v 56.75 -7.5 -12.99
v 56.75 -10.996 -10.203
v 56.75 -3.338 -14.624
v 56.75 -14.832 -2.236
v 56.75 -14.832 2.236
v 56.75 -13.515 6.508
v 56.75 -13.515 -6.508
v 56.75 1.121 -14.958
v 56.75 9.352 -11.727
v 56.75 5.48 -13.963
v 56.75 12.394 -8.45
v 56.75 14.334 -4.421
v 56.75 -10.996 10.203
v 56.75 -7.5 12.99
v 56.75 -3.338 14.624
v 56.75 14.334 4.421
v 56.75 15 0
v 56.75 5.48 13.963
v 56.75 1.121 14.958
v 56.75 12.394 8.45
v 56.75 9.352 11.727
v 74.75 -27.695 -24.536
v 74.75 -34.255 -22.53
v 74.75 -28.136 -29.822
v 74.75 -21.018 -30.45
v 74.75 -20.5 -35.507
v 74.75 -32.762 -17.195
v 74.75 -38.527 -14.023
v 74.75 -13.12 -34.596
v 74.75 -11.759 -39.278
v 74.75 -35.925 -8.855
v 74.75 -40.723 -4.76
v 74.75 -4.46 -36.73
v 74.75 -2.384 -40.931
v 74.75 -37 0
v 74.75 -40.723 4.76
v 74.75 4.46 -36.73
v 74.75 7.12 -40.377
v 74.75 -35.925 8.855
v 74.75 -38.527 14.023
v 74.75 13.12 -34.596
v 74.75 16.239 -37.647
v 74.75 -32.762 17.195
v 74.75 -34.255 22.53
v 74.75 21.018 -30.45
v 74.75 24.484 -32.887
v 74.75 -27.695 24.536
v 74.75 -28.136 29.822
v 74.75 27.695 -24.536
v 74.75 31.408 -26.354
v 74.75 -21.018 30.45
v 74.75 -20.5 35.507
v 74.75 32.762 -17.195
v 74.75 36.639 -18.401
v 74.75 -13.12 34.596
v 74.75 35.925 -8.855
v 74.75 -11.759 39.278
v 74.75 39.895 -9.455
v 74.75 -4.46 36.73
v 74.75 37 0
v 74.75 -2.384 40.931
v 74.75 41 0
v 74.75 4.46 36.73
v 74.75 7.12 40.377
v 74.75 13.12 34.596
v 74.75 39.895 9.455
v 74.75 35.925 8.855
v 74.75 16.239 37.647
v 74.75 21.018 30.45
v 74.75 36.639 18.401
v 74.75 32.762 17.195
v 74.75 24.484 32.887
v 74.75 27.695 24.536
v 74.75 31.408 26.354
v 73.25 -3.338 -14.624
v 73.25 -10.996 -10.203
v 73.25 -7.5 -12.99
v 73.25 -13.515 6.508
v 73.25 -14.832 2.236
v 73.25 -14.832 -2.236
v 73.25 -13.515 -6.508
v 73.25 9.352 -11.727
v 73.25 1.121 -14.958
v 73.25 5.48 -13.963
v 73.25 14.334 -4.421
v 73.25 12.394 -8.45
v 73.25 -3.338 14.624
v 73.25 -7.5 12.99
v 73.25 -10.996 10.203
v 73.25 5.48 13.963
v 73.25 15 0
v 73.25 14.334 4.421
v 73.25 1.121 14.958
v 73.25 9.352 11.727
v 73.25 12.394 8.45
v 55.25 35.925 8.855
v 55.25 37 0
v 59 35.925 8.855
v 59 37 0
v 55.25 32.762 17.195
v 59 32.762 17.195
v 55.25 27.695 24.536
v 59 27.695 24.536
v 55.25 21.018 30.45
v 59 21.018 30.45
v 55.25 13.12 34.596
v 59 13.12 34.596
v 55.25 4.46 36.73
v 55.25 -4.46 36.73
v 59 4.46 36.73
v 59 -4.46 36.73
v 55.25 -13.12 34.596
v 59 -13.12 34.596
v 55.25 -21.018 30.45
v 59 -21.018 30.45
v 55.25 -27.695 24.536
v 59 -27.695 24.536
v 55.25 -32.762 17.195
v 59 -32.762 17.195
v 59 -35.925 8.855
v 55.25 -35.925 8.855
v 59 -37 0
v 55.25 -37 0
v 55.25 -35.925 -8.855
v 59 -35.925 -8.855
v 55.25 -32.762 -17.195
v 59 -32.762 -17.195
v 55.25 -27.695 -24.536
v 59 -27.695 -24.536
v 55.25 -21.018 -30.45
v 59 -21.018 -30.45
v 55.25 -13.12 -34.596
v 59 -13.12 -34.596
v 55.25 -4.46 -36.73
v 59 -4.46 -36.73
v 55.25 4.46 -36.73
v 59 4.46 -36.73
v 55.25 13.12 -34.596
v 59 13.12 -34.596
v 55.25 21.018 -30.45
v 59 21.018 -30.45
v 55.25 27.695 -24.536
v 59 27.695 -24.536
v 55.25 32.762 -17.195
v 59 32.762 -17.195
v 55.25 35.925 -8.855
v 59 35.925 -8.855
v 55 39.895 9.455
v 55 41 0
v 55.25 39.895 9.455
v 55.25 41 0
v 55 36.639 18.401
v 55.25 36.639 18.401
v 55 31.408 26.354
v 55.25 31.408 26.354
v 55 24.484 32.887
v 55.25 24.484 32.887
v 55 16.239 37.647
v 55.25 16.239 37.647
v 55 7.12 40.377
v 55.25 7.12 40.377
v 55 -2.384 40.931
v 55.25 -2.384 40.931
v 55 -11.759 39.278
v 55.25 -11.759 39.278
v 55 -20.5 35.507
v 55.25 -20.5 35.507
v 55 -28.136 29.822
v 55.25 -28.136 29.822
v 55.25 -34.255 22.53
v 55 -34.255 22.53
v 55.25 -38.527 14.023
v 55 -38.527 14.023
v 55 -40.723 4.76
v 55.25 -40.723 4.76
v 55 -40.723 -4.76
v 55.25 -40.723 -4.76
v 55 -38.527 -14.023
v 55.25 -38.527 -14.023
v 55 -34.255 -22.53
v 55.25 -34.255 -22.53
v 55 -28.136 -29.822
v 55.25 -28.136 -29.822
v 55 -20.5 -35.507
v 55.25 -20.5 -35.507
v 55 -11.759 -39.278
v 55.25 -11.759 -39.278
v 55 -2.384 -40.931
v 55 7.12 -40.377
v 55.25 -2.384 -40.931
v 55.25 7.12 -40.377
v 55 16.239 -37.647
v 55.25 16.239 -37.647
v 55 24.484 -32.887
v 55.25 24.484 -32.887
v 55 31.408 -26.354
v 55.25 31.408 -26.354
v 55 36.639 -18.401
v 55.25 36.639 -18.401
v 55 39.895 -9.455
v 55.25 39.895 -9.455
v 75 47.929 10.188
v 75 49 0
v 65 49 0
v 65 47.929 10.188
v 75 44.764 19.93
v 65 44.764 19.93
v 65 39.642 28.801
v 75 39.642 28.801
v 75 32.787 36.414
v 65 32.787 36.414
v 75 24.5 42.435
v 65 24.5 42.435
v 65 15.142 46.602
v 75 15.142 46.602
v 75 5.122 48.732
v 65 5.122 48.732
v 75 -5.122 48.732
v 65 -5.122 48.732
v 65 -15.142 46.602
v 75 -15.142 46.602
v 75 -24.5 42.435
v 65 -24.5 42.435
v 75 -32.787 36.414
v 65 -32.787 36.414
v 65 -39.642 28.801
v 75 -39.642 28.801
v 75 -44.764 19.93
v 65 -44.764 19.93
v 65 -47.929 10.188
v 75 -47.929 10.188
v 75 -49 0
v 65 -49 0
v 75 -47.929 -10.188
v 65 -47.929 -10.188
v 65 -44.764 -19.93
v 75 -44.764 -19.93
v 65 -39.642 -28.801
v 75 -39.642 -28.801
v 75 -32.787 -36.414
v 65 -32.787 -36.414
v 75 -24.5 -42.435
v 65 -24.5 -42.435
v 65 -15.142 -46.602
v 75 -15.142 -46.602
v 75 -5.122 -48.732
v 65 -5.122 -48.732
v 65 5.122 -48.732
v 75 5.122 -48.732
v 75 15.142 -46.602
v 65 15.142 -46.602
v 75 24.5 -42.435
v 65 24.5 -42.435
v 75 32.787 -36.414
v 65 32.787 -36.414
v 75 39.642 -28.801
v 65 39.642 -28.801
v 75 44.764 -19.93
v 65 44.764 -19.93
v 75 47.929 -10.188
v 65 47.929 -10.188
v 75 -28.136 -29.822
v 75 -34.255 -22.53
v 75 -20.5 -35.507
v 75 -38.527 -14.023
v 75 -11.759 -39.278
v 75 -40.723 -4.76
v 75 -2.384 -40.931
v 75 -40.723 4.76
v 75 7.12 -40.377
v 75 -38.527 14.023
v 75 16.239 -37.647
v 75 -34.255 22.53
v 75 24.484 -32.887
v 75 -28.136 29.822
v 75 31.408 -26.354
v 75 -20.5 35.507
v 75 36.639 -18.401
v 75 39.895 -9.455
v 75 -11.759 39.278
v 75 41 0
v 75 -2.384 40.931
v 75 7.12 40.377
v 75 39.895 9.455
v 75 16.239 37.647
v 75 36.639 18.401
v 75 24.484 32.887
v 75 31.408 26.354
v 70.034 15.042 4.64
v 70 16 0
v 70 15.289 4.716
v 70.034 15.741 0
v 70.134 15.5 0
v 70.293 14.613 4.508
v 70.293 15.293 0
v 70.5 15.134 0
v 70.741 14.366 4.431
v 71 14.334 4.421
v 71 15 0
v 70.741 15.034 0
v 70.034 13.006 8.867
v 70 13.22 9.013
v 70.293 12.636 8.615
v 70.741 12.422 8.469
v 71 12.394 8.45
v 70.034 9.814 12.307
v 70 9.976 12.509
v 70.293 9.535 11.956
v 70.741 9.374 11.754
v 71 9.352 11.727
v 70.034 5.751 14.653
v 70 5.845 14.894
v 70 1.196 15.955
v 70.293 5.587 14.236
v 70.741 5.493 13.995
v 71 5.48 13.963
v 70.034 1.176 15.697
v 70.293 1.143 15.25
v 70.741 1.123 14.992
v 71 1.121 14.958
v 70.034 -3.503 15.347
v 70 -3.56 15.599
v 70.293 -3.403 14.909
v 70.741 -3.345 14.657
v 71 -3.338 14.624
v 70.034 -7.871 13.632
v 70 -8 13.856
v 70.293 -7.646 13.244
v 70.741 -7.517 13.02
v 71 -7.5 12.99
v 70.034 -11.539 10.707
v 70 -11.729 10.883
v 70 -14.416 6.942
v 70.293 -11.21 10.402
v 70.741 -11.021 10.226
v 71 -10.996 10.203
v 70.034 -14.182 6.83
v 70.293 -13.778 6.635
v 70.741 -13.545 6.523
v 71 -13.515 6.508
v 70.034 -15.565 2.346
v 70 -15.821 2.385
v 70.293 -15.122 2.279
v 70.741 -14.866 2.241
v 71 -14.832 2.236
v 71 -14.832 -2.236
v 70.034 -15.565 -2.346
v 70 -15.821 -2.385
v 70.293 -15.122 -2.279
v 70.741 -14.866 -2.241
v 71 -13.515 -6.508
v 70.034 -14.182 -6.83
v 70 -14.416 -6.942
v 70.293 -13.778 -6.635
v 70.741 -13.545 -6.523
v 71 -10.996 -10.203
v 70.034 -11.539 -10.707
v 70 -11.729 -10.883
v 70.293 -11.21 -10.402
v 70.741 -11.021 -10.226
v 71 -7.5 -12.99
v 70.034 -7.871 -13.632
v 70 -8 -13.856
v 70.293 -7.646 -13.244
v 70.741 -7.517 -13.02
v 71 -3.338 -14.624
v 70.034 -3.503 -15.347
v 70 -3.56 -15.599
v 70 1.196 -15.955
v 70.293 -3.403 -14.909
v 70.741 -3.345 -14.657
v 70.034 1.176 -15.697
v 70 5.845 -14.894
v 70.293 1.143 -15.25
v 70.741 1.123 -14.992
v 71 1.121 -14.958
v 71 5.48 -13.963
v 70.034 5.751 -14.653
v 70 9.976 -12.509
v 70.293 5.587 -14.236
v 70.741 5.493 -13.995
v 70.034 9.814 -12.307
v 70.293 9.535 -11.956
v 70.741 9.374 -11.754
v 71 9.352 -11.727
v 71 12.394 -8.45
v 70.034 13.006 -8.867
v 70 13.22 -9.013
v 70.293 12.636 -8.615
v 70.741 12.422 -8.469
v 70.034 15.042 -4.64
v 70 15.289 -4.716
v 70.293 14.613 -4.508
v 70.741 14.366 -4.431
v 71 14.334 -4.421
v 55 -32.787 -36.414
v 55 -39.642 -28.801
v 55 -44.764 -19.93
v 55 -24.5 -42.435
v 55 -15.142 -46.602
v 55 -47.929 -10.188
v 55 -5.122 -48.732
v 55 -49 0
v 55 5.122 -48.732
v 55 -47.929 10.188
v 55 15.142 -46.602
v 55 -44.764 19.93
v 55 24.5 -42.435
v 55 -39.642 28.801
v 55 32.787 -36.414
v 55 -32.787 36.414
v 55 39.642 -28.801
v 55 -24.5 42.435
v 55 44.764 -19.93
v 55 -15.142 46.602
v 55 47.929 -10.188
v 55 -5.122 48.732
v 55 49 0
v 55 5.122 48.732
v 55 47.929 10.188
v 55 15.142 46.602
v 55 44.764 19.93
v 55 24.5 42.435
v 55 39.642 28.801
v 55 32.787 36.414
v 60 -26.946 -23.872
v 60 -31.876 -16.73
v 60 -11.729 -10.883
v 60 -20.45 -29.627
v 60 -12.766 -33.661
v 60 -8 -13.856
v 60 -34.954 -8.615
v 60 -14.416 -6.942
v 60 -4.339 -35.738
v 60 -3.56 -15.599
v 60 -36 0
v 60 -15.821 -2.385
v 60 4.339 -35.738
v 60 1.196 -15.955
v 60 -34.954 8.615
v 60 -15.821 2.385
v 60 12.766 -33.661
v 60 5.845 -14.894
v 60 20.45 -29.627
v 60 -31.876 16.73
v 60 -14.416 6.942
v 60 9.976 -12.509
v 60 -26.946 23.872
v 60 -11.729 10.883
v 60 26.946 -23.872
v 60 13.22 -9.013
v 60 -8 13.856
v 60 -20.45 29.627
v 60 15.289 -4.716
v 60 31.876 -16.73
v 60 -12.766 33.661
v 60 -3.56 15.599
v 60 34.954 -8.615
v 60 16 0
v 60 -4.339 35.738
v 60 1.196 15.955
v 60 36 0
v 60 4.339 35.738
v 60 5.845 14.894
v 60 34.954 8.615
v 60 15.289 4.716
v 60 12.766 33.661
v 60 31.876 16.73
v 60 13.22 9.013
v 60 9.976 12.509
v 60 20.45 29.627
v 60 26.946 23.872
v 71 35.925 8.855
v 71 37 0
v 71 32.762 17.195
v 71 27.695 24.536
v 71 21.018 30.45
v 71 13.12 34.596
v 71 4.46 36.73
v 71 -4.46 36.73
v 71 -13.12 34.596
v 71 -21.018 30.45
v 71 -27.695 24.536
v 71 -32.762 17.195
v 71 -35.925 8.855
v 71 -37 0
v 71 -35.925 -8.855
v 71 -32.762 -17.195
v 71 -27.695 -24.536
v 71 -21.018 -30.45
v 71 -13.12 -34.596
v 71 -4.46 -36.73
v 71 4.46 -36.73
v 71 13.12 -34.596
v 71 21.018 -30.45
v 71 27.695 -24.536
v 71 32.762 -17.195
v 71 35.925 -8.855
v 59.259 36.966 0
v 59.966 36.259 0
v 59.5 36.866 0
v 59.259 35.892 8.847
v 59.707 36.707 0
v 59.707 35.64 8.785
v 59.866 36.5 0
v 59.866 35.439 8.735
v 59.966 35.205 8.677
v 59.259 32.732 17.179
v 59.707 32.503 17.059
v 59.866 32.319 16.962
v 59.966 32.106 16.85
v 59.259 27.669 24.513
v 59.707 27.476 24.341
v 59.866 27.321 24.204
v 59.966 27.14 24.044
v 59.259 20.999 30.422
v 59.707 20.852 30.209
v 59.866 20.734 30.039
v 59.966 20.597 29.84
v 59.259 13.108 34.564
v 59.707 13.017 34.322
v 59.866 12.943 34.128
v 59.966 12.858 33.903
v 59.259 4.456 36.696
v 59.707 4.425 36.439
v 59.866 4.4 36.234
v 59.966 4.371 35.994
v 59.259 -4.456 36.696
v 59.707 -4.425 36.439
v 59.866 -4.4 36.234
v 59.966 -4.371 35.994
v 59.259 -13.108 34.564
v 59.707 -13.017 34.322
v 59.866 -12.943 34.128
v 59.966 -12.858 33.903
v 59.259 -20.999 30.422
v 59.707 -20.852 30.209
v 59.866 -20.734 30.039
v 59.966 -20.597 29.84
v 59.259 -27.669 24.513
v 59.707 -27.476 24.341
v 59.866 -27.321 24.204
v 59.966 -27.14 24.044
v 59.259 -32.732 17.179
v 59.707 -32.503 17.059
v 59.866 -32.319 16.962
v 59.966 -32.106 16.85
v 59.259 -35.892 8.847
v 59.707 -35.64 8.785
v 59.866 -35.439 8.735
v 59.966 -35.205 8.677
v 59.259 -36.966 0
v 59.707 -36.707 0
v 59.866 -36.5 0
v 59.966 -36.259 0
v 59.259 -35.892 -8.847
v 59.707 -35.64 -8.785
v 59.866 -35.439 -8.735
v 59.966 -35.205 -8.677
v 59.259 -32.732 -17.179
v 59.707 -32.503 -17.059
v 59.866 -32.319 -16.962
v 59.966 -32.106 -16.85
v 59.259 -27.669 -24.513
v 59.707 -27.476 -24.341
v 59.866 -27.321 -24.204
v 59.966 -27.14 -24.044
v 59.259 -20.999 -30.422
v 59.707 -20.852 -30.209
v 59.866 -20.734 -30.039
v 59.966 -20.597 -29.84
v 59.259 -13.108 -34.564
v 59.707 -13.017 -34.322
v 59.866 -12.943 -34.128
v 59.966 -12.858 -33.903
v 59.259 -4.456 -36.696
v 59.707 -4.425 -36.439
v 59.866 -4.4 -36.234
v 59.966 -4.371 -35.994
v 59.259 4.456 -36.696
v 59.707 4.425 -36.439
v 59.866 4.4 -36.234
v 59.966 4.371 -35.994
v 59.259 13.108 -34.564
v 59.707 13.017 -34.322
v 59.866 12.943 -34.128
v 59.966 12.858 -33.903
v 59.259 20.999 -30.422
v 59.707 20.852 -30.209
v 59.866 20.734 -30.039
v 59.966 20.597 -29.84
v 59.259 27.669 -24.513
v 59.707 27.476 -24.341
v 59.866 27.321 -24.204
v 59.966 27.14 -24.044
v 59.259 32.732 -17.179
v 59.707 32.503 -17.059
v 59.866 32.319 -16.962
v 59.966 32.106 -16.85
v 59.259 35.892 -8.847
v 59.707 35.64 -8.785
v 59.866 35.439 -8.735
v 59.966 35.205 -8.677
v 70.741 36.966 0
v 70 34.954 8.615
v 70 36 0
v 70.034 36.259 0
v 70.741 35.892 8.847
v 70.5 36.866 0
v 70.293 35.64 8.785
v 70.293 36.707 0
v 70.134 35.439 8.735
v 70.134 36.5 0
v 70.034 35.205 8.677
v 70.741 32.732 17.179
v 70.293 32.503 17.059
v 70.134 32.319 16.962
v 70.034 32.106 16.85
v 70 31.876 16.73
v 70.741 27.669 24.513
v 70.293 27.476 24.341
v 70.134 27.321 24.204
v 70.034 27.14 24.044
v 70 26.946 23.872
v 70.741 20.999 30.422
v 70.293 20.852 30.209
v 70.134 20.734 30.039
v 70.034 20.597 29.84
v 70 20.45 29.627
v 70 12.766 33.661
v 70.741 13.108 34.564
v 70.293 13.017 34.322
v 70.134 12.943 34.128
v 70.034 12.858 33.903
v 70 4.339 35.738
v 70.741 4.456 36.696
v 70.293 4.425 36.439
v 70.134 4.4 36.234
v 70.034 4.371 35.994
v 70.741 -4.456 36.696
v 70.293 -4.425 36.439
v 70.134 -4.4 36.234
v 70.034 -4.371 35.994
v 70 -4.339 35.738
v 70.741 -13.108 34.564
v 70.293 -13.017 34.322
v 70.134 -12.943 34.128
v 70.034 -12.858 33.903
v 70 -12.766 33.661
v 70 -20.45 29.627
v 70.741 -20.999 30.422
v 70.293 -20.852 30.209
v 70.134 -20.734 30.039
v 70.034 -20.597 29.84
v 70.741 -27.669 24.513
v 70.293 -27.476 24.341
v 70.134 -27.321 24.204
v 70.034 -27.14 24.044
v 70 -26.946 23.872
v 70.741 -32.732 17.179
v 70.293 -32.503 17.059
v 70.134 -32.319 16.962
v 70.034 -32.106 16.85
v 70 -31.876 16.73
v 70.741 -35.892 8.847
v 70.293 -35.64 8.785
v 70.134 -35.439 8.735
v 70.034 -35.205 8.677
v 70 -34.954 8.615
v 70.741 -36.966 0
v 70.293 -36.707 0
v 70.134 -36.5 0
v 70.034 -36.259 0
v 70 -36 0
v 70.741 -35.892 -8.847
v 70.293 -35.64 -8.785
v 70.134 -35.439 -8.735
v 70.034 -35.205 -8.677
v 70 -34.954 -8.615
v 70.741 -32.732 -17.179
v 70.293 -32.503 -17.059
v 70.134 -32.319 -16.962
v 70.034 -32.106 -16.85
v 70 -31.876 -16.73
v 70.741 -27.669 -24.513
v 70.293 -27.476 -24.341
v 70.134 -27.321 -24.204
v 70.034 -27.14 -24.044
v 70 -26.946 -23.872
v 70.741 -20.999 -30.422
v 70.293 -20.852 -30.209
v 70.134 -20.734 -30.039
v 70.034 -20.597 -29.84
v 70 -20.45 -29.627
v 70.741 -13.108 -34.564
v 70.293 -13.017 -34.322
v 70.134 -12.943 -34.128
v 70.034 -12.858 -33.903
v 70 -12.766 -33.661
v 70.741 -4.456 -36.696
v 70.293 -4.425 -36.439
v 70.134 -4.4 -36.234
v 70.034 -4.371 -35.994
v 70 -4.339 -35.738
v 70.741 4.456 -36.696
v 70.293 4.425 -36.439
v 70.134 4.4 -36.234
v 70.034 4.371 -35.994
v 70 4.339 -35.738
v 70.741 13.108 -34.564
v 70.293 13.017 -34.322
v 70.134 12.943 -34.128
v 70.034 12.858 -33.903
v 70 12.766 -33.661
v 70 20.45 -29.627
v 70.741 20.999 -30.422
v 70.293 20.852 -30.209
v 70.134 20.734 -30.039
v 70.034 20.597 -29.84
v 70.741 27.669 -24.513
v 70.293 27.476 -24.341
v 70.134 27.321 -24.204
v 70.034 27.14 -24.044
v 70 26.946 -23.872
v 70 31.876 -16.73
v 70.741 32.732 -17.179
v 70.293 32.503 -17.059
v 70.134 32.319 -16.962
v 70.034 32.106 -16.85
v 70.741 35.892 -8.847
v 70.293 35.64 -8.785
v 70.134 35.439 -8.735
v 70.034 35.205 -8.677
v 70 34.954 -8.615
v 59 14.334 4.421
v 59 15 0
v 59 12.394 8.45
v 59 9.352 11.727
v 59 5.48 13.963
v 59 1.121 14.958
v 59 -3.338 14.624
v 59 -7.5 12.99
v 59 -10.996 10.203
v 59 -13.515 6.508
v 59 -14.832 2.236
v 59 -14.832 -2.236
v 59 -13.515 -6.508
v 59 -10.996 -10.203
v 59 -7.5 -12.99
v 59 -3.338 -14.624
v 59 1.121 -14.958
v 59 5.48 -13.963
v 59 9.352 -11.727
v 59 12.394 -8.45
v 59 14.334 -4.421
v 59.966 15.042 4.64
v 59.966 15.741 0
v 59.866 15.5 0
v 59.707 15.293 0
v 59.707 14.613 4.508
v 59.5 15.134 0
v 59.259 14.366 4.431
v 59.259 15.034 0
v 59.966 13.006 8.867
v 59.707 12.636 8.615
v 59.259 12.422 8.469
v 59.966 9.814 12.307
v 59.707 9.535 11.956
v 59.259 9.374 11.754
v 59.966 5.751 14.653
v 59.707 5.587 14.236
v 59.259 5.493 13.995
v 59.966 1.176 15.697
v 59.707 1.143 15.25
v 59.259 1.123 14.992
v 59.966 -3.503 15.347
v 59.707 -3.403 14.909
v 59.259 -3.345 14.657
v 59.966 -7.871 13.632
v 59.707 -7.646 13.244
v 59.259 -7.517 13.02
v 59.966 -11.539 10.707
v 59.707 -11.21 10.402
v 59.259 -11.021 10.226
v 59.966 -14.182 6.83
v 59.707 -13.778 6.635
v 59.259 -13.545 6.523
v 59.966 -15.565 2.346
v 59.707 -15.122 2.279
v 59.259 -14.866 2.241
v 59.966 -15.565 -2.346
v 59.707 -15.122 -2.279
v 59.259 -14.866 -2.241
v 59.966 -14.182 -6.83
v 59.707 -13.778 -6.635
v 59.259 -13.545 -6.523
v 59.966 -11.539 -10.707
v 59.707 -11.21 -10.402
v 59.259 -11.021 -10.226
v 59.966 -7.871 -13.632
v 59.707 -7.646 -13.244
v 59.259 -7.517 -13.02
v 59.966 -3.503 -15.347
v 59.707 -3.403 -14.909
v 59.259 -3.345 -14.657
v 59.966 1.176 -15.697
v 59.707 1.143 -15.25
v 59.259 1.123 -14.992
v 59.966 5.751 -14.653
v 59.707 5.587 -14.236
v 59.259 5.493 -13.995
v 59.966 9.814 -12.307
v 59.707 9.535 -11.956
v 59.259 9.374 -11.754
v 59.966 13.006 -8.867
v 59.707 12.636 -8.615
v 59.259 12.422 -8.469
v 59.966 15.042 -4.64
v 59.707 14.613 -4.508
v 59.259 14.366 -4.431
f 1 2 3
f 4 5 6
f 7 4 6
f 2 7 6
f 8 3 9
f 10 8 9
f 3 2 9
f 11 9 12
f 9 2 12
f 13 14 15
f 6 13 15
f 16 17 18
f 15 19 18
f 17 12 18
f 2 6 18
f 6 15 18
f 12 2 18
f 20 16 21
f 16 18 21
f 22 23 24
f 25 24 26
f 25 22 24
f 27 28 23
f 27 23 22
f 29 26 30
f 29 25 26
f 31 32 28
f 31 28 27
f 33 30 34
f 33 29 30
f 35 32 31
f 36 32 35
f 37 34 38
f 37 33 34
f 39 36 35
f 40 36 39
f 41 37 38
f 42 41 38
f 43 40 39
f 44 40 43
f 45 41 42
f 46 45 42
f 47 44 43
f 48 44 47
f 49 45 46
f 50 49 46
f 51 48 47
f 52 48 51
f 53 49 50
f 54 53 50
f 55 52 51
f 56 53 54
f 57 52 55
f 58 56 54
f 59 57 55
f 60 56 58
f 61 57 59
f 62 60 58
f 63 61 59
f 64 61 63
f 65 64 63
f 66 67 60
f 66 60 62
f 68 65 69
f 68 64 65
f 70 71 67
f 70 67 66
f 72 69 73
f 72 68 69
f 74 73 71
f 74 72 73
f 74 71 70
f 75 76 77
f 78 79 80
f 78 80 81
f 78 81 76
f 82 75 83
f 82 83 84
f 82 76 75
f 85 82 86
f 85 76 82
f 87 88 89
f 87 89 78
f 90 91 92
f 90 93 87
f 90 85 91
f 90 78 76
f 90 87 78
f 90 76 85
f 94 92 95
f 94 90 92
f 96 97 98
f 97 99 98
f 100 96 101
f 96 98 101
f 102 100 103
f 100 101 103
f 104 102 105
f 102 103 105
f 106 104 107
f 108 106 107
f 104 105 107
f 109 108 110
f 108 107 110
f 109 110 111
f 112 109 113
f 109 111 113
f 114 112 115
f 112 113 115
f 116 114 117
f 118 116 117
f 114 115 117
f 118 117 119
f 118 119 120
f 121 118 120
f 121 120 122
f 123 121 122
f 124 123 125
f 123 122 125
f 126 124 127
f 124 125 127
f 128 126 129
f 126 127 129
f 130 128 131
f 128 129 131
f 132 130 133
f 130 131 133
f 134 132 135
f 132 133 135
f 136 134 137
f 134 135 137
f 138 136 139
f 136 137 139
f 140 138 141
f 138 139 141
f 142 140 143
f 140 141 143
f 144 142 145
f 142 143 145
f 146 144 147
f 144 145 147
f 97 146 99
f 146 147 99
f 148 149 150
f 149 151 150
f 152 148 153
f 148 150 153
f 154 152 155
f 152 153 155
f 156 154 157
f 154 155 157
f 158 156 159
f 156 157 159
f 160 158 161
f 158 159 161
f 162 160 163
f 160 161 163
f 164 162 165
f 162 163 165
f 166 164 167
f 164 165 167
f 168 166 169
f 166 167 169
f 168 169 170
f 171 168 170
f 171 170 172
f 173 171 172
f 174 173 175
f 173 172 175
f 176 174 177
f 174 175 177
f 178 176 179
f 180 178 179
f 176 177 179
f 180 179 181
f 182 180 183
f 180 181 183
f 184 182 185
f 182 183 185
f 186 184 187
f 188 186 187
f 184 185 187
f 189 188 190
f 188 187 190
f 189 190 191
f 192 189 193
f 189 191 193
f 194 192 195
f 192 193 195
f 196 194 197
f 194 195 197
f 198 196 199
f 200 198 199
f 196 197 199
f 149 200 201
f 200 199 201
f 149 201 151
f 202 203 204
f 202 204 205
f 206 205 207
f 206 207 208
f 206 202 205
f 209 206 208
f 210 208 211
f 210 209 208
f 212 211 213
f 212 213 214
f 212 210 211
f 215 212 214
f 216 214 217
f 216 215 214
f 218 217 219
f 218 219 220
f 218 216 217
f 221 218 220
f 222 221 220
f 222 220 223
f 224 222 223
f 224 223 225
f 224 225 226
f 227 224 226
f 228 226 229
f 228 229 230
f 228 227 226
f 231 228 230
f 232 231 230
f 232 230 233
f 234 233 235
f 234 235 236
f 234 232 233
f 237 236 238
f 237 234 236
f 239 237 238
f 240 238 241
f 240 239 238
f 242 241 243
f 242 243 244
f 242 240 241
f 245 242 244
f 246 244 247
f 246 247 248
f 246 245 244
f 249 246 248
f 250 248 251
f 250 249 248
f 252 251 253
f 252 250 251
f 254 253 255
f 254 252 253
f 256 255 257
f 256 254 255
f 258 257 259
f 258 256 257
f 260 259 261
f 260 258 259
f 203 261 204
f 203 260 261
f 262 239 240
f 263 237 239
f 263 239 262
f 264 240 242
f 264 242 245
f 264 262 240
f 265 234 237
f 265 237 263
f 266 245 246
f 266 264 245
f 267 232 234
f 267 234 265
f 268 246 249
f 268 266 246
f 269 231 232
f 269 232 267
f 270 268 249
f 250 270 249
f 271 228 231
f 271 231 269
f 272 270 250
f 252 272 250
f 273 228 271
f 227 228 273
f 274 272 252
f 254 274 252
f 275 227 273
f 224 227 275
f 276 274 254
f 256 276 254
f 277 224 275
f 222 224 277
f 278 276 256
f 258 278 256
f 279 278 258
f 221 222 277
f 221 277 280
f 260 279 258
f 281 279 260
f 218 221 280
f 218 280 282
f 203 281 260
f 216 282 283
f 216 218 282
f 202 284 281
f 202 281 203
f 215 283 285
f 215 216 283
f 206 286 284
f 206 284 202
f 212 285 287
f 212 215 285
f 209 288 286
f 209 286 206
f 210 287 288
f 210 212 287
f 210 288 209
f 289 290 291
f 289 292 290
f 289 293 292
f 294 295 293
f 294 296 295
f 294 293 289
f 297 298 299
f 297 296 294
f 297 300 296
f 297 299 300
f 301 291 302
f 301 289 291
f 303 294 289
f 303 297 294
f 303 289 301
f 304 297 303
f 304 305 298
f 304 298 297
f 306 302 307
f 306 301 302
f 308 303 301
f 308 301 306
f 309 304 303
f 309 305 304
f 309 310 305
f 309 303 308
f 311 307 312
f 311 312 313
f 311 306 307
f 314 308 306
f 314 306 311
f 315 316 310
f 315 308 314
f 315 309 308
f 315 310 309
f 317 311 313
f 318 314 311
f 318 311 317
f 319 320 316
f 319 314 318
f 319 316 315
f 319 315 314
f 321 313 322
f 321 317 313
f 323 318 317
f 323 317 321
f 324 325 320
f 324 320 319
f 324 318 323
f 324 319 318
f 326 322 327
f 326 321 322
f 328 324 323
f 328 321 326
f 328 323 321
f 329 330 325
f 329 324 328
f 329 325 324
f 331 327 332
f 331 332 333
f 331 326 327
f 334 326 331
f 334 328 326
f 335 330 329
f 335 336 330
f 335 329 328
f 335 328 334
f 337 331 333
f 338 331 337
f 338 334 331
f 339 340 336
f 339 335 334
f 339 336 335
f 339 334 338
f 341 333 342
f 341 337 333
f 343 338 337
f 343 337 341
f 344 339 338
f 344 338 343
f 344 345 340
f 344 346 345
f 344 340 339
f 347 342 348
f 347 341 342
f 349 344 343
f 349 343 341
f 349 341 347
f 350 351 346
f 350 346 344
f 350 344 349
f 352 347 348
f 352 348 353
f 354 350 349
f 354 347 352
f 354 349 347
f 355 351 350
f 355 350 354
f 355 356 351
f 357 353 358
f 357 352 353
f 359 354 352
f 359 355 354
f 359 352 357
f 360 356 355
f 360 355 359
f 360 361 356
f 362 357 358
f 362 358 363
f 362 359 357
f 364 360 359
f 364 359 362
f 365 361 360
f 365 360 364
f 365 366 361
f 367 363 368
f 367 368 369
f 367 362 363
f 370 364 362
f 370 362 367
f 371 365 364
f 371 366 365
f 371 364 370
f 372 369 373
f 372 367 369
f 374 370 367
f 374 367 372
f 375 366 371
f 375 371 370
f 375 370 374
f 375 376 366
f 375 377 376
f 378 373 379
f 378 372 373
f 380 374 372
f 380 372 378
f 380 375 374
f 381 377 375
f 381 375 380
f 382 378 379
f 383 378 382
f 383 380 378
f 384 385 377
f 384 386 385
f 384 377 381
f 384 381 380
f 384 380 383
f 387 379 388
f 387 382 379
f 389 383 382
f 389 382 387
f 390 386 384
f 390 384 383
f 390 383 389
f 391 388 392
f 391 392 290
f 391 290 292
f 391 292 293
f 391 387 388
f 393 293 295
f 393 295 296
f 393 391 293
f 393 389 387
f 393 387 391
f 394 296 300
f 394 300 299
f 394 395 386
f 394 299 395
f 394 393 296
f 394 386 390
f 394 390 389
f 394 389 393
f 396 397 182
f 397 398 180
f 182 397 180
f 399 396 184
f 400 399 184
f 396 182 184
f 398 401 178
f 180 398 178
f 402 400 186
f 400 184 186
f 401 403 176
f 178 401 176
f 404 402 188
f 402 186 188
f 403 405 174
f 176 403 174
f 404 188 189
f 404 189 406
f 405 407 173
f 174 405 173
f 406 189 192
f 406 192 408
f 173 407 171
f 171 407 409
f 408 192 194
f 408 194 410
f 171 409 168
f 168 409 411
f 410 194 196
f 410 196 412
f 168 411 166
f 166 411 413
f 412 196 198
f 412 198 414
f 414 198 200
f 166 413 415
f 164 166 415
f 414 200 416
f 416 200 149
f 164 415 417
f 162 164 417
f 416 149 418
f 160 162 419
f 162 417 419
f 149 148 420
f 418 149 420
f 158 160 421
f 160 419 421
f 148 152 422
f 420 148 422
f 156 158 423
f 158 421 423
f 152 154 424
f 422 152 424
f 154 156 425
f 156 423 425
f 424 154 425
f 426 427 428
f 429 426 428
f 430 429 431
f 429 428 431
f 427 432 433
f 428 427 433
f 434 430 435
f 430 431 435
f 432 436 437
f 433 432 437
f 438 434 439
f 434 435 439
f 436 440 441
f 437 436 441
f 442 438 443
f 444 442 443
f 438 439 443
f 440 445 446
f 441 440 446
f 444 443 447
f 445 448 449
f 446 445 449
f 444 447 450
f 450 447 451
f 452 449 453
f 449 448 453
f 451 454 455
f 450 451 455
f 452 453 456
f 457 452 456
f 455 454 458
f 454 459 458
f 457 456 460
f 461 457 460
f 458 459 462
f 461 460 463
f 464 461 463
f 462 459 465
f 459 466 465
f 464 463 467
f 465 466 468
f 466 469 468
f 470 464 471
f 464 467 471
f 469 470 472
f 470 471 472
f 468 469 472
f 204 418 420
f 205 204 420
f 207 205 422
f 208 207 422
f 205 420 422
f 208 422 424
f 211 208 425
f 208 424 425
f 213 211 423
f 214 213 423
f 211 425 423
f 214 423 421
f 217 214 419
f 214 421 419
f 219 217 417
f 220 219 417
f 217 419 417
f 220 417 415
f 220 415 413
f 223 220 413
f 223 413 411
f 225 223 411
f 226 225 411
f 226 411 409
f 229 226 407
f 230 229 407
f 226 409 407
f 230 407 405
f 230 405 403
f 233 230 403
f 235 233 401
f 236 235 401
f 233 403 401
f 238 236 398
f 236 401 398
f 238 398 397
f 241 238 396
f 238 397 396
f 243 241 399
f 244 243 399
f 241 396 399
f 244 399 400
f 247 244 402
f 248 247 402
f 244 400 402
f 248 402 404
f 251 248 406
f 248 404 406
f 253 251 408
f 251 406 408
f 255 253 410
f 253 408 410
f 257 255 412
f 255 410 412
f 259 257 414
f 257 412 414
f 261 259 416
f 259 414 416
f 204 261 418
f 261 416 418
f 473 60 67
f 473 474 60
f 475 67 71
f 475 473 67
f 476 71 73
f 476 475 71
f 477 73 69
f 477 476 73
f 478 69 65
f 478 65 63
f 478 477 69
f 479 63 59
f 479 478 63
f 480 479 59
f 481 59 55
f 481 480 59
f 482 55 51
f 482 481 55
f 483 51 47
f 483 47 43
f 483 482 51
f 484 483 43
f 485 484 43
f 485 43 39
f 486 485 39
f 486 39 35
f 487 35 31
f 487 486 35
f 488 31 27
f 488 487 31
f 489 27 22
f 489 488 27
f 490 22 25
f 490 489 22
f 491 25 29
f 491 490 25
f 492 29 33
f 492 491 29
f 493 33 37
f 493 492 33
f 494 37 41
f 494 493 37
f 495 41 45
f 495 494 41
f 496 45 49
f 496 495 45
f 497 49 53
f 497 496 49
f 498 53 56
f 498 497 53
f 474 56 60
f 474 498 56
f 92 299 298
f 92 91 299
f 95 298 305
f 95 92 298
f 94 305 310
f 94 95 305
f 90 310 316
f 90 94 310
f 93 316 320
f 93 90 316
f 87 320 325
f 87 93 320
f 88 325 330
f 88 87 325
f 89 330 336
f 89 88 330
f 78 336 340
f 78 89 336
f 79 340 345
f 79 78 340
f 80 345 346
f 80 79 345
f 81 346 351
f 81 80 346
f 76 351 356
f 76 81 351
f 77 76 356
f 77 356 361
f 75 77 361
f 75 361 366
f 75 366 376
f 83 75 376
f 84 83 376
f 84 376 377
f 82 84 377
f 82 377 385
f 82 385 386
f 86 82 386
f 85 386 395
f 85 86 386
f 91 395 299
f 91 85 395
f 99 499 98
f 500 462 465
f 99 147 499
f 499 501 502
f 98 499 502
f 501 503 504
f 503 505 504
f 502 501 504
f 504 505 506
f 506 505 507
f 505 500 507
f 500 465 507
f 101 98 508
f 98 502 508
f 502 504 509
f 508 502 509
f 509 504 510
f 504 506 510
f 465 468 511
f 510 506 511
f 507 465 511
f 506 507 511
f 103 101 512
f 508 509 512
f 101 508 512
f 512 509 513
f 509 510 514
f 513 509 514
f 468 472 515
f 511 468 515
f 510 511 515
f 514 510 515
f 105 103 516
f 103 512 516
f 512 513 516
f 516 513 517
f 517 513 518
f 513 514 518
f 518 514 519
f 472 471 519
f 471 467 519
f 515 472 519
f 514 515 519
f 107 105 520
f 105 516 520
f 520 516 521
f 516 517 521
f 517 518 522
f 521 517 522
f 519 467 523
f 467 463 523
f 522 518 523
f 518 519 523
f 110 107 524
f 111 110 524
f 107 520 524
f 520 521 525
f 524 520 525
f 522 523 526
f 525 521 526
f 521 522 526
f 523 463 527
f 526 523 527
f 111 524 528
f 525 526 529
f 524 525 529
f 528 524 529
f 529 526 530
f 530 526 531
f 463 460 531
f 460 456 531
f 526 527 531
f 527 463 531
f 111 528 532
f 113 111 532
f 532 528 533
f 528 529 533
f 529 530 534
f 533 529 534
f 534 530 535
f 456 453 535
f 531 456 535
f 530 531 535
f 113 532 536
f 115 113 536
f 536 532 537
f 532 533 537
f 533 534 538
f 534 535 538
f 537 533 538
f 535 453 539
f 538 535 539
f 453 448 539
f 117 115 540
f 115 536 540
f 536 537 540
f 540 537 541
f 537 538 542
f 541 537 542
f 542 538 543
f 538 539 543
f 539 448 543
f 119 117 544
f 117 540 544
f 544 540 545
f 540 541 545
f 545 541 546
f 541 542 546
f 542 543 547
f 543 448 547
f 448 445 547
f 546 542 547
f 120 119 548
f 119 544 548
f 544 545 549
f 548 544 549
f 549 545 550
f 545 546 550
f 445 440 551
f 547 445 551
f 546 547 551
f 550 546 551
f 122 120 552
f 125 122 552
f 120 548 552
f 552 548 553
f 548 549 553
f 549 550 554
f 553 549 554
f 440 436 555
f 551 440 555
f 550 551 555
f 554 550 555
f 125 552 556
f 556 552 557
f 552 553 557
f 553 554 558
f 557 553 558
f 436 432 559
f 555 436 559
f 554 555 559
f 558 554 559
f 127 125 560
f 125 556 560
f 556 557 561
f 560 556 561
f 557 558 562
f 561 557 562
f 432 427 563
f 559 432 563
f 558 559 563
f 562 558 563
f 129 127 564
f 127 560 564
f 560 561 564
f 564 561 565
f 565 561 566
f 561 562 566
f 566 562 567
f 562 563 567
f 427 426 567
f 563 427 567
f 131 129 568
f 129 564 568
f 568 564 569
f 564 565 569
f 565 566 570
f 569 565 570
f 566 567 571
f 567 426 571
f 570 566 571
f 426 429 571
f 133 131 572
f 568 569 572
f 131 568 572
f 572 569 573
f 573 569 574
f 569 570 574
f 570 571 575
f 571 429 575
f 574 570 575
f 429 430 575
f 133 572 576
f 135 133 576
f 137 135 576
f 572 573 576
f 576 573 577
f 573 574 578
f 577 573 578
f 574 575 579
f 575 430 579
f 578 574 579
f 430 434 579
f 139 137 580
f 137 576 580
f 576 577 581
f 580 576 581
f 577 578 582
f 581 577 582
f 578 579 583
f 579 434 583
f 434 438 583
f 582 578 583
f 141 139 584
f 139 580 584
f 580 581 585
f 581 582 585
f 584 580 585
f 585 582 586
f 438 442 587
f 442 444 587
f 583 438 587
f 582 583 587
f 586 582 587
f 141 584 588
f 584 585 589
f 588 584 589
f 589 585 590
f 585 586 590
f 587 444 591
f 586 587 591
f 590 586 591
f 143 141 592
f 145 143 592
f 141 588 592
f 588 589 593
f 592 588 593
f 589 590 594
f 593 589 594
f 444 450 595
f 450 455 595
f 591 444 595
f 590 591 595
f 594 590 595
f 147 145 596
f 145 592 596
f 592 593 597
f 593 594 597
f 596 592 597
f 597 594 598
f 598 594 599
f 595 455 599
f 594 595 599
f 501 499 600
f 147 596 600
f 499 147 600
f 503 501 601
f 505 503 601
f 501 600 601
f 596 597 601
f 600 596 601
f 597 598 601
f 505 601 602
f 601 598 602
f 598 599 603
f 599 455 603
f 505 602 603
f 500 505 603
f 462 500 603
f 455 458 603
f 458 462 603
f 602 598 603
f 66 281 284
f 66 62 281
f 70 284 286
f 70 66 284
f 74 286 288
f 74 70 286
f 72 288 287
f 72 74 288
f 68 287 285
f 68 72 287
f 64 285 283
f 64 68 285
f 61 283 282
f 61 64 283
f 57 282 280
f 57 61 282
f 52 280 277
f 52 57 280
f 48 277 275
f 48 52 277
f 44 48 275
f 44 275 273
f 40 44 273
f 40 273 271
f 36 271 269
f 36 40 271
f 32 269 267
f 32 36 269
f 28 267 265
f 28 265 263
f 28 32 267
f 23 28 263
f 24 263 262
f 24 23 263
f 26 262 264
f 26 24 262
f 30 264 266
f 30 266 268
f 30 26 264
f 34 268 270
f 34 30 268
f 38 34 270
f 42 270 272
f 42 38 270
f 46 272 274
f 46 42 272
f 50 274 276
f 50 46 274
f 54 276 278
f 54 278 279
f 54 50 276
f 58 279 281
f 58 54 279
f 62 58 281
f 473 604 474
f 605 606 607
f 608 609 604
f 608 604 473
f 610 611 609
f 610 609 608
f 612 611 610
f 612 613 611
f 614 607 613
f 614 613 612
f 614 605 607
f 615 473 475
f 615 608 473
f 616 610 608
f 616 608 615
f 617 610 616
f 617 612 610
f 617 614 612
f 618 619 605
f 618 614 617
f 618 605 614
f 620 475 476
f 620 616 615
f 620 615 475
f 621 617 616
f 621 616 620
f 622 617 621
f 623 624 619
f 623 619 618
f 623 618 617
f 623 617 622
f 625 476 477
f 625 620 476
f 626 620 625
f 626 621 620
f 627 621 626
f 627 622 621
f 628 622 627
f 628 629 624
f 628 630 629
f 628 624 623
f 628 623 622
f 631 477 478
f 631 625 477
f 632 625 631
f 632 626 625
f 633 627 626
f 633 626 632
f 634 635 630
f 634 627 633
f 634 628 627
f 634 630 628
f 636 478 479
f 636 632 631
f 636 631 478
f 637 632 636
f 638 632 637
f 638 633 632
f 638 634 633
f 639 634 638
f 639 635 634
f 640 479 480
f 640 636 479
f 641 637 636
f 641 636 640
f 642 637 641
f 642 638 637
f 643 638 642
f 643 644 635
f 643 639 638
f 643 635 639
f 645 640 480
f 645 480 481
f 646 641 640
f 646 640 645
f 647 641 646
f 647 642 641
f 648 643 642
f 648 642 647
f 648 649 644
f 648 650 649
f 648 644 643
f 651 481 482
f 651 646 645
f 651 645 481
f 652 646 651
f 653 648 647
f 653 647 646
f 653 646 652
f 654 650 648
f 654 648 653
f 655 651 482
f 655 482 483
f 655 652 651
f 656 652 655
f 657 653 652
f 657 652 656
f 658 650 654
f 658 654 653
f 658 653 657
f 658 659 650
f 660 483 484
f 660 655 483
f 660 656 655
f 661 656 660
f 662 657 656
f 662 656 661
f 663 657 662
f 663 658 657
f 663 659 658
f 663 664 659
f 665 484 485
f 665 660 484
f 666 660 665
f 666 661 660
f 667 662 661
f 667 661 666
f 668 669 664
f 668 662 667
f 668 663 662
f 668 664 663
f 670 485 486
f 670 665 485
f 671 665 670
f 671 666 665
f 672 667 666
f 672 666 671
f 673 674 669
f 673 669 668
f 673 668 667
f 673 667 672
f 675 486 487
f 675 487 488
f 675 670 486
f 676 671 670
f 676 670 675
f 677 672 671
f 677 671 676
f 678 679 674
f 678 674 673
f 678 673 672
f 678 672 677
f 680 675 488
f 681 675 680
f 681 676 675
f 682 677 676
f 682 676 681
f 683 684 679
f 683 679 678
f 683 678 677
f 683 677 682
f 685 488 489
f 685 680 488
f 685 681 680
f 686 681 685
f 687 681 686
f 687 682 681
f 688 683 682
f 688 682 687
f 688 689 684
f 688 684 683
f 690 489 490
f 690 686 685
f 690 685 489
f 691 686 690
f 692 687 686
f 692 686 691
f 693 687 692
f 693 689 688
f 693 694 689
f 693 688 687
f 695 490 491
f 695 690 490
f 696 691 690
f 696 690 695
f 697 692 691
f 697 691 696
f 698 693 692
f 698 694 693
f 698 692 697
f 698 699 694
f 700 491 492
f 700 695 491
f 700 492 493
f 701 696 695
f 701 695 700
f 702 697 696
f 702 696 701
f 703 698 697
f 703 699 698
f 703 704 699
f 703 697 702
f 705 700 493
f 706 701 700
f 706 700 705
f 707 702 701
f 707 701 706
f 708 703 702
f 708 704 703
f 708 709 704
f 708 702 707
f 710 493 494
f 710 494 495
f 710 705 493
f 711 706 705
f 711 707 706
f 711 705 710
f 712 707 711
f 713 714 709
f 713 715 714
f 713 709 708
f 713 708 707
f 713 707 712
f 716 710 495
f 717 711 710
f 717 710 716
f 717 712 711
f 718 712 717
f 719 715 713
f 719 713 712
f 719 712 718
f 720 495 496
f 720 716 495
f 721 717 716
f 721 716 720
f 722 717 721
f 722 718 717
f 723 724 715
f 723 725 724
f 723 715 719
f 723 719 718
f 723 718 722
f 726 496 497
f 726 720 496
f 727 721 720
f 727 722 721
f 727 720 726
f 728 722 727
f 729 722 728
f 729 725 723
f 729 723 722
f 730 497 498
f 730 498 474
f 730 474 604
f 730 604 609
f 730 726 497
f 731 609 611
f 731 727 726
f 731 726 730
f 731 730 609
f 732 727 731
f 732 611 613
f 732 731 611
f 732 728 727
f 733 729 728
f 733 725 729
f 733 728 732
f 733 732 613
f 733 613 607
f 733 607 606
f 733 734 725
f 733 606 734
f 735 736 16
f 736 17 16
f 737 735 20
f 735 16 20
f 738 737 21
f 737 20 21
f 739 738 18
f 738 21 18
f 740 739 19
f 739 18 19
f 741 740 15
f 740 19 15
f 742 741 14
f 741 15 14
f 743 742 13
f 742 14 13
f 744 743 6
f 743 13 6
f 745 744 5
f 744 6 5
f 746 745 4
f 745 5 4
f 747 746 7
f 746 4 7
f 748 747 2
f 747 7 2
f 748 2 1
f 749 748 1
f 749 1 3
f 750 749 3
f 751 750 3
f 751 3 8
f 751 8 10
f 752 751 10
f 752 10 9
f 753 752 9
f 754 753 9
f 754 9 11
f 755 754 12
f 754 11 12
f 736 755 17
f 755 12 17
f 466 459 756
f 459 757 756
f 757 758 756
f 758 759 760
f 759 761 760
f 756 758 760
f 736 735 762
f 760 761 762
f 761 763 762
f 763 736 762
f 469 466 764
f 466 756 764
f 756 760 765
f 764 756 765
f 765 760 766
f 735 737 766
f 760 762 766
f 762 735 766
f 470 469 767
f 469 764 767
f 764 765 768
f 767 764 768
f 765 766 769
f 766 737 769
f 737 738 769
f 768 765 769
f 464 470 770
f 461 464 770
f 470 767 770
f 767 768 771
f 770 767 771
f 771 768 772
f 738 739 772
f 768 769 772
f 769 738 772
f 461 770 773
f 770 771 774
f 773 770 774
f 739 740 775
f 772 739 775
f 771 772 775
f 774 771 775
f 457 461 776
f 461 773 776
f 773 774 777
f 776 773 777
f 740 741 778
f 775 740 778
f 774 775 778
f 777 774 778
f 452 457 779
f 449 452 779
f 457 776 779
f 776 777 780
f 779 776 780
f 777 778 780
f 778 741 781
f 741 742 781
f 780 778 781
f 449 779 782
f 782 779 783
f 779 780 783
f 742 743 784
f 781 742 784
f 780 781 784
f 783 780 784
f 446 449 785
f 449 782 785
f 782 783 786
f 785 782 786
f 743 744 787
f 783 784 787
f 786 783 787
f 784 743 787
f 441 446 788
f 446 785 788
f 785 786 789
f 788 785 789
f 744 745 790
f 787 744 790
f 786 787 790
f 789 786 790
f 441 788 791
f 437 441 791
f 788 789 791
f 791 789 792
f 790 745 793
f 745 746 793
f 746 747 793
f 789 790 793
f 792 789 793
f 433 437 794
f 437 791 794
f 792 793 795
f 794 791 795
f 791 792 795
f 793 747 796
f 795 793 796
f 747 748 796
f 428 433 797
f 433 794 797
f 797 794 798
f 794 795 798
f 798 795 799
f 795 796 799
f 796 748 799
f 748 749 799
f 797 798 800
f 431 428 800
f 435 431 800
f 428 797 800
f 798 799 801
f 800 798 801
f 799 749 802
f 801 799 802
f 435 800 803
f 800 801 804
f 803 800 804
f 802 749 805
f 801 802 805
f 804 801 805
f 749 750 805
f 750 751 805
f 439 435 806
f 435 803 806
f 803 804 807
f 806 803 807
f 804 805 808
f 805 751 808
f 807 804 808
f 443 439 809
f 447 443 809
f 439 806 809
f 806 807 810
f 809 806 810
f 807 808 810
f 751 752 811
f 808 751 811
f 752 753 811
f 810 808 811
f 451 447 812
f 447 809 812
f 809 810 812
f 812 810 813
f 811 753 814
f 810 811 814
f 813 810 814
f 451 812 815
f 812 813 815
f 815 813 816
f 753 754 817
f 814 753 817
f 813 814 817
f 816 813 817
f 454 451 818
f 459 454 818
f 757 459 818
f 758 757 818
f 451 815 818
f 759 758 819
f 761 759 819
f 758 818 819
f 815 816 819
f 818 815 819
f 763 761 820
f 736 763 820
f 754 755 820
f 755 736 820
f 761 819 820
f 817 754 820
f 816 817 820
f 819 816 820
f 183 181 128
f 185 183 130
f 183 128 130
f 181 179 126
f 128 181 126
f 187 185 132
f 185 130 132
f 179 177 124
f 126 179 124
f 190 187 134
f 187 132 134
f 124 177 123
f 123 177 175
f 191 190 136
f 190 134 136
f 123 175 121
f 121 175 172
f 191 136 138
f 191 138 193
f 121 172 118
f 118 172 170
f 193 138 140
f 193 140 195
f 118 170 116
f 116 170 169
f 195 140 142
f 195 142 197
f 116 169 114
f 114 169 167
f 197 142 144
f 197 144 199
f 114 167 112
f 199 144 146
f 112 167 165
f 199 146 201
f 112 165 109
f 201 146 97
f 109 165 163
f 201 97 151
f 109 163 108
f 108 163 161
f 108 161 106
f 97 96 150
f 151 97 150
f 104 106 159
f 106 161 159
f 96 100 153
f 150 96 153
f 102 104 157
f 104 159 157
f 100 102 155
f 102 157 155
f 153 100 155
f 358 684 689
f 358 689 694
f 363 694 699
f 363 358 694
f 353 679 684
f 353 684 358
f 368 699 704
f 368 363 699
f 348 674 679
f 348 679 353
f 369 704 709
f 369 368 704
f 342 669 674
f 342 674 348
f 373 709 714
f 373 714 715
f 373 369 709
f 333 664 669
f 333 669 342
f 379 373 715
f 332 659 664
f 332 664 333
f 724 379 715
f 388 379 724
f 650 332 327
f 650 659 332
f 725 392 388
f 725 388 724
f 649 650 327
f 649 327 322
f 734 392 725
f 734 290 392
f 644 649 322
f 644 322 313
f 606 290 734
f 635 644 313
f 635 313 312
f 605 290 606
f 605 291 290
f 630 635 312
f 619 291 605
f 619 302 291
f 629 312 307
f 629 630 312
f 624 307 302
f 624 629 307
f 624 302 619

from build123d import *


with BuildPart() as wheelhalf:
    # Sketch177 → Revolution009 (revolve)
    with BuildSketch(Plane.XY):
        with BuildLine():
            Line((0, 49), (10, 49))
            Line((10, 49), (10, 41))
            Line((10, 41), (9.75, 41))
            Line((9.75, 41), (9.75, 37))
            Line((9.75, 37), (6, 37))
            ThreePointArc((6, 37), (5.292892, 36.707106), (5, 35.999997))
            Line((5, 35.999997), (5, 16))
            ThreePointArc((5, 16), (5.292893, 15.292893), (6, 15))
            Line((6, 15), (8.25, 15))
            Line((8.25, 15), (8.25, 0))
            Line((8.25, 0), (0, 0))
            Line((0, 0), (0, 49))
        make_face()
    revolve(axis=Axis((0, 0, 0), (1, 0, 0)))


with BuildPart() as wheel:
    # Part__Mirroring010: instance of WheelHalf
    add(wheelhalf.part.mirror(Plane(origin=(0, 0, 0), x_dir=(0, -1, 0), z_dir=(1, 0, 0))))

    # Fusion004020026: union WheelHalf
    add(wheelhalf.part)


with BuildPart() as wheel_1:
    # Fusion004020026 placement: moved
    add(wheel.part.moved(Location((65, 0, 0))))


solid = wheel_1.part
